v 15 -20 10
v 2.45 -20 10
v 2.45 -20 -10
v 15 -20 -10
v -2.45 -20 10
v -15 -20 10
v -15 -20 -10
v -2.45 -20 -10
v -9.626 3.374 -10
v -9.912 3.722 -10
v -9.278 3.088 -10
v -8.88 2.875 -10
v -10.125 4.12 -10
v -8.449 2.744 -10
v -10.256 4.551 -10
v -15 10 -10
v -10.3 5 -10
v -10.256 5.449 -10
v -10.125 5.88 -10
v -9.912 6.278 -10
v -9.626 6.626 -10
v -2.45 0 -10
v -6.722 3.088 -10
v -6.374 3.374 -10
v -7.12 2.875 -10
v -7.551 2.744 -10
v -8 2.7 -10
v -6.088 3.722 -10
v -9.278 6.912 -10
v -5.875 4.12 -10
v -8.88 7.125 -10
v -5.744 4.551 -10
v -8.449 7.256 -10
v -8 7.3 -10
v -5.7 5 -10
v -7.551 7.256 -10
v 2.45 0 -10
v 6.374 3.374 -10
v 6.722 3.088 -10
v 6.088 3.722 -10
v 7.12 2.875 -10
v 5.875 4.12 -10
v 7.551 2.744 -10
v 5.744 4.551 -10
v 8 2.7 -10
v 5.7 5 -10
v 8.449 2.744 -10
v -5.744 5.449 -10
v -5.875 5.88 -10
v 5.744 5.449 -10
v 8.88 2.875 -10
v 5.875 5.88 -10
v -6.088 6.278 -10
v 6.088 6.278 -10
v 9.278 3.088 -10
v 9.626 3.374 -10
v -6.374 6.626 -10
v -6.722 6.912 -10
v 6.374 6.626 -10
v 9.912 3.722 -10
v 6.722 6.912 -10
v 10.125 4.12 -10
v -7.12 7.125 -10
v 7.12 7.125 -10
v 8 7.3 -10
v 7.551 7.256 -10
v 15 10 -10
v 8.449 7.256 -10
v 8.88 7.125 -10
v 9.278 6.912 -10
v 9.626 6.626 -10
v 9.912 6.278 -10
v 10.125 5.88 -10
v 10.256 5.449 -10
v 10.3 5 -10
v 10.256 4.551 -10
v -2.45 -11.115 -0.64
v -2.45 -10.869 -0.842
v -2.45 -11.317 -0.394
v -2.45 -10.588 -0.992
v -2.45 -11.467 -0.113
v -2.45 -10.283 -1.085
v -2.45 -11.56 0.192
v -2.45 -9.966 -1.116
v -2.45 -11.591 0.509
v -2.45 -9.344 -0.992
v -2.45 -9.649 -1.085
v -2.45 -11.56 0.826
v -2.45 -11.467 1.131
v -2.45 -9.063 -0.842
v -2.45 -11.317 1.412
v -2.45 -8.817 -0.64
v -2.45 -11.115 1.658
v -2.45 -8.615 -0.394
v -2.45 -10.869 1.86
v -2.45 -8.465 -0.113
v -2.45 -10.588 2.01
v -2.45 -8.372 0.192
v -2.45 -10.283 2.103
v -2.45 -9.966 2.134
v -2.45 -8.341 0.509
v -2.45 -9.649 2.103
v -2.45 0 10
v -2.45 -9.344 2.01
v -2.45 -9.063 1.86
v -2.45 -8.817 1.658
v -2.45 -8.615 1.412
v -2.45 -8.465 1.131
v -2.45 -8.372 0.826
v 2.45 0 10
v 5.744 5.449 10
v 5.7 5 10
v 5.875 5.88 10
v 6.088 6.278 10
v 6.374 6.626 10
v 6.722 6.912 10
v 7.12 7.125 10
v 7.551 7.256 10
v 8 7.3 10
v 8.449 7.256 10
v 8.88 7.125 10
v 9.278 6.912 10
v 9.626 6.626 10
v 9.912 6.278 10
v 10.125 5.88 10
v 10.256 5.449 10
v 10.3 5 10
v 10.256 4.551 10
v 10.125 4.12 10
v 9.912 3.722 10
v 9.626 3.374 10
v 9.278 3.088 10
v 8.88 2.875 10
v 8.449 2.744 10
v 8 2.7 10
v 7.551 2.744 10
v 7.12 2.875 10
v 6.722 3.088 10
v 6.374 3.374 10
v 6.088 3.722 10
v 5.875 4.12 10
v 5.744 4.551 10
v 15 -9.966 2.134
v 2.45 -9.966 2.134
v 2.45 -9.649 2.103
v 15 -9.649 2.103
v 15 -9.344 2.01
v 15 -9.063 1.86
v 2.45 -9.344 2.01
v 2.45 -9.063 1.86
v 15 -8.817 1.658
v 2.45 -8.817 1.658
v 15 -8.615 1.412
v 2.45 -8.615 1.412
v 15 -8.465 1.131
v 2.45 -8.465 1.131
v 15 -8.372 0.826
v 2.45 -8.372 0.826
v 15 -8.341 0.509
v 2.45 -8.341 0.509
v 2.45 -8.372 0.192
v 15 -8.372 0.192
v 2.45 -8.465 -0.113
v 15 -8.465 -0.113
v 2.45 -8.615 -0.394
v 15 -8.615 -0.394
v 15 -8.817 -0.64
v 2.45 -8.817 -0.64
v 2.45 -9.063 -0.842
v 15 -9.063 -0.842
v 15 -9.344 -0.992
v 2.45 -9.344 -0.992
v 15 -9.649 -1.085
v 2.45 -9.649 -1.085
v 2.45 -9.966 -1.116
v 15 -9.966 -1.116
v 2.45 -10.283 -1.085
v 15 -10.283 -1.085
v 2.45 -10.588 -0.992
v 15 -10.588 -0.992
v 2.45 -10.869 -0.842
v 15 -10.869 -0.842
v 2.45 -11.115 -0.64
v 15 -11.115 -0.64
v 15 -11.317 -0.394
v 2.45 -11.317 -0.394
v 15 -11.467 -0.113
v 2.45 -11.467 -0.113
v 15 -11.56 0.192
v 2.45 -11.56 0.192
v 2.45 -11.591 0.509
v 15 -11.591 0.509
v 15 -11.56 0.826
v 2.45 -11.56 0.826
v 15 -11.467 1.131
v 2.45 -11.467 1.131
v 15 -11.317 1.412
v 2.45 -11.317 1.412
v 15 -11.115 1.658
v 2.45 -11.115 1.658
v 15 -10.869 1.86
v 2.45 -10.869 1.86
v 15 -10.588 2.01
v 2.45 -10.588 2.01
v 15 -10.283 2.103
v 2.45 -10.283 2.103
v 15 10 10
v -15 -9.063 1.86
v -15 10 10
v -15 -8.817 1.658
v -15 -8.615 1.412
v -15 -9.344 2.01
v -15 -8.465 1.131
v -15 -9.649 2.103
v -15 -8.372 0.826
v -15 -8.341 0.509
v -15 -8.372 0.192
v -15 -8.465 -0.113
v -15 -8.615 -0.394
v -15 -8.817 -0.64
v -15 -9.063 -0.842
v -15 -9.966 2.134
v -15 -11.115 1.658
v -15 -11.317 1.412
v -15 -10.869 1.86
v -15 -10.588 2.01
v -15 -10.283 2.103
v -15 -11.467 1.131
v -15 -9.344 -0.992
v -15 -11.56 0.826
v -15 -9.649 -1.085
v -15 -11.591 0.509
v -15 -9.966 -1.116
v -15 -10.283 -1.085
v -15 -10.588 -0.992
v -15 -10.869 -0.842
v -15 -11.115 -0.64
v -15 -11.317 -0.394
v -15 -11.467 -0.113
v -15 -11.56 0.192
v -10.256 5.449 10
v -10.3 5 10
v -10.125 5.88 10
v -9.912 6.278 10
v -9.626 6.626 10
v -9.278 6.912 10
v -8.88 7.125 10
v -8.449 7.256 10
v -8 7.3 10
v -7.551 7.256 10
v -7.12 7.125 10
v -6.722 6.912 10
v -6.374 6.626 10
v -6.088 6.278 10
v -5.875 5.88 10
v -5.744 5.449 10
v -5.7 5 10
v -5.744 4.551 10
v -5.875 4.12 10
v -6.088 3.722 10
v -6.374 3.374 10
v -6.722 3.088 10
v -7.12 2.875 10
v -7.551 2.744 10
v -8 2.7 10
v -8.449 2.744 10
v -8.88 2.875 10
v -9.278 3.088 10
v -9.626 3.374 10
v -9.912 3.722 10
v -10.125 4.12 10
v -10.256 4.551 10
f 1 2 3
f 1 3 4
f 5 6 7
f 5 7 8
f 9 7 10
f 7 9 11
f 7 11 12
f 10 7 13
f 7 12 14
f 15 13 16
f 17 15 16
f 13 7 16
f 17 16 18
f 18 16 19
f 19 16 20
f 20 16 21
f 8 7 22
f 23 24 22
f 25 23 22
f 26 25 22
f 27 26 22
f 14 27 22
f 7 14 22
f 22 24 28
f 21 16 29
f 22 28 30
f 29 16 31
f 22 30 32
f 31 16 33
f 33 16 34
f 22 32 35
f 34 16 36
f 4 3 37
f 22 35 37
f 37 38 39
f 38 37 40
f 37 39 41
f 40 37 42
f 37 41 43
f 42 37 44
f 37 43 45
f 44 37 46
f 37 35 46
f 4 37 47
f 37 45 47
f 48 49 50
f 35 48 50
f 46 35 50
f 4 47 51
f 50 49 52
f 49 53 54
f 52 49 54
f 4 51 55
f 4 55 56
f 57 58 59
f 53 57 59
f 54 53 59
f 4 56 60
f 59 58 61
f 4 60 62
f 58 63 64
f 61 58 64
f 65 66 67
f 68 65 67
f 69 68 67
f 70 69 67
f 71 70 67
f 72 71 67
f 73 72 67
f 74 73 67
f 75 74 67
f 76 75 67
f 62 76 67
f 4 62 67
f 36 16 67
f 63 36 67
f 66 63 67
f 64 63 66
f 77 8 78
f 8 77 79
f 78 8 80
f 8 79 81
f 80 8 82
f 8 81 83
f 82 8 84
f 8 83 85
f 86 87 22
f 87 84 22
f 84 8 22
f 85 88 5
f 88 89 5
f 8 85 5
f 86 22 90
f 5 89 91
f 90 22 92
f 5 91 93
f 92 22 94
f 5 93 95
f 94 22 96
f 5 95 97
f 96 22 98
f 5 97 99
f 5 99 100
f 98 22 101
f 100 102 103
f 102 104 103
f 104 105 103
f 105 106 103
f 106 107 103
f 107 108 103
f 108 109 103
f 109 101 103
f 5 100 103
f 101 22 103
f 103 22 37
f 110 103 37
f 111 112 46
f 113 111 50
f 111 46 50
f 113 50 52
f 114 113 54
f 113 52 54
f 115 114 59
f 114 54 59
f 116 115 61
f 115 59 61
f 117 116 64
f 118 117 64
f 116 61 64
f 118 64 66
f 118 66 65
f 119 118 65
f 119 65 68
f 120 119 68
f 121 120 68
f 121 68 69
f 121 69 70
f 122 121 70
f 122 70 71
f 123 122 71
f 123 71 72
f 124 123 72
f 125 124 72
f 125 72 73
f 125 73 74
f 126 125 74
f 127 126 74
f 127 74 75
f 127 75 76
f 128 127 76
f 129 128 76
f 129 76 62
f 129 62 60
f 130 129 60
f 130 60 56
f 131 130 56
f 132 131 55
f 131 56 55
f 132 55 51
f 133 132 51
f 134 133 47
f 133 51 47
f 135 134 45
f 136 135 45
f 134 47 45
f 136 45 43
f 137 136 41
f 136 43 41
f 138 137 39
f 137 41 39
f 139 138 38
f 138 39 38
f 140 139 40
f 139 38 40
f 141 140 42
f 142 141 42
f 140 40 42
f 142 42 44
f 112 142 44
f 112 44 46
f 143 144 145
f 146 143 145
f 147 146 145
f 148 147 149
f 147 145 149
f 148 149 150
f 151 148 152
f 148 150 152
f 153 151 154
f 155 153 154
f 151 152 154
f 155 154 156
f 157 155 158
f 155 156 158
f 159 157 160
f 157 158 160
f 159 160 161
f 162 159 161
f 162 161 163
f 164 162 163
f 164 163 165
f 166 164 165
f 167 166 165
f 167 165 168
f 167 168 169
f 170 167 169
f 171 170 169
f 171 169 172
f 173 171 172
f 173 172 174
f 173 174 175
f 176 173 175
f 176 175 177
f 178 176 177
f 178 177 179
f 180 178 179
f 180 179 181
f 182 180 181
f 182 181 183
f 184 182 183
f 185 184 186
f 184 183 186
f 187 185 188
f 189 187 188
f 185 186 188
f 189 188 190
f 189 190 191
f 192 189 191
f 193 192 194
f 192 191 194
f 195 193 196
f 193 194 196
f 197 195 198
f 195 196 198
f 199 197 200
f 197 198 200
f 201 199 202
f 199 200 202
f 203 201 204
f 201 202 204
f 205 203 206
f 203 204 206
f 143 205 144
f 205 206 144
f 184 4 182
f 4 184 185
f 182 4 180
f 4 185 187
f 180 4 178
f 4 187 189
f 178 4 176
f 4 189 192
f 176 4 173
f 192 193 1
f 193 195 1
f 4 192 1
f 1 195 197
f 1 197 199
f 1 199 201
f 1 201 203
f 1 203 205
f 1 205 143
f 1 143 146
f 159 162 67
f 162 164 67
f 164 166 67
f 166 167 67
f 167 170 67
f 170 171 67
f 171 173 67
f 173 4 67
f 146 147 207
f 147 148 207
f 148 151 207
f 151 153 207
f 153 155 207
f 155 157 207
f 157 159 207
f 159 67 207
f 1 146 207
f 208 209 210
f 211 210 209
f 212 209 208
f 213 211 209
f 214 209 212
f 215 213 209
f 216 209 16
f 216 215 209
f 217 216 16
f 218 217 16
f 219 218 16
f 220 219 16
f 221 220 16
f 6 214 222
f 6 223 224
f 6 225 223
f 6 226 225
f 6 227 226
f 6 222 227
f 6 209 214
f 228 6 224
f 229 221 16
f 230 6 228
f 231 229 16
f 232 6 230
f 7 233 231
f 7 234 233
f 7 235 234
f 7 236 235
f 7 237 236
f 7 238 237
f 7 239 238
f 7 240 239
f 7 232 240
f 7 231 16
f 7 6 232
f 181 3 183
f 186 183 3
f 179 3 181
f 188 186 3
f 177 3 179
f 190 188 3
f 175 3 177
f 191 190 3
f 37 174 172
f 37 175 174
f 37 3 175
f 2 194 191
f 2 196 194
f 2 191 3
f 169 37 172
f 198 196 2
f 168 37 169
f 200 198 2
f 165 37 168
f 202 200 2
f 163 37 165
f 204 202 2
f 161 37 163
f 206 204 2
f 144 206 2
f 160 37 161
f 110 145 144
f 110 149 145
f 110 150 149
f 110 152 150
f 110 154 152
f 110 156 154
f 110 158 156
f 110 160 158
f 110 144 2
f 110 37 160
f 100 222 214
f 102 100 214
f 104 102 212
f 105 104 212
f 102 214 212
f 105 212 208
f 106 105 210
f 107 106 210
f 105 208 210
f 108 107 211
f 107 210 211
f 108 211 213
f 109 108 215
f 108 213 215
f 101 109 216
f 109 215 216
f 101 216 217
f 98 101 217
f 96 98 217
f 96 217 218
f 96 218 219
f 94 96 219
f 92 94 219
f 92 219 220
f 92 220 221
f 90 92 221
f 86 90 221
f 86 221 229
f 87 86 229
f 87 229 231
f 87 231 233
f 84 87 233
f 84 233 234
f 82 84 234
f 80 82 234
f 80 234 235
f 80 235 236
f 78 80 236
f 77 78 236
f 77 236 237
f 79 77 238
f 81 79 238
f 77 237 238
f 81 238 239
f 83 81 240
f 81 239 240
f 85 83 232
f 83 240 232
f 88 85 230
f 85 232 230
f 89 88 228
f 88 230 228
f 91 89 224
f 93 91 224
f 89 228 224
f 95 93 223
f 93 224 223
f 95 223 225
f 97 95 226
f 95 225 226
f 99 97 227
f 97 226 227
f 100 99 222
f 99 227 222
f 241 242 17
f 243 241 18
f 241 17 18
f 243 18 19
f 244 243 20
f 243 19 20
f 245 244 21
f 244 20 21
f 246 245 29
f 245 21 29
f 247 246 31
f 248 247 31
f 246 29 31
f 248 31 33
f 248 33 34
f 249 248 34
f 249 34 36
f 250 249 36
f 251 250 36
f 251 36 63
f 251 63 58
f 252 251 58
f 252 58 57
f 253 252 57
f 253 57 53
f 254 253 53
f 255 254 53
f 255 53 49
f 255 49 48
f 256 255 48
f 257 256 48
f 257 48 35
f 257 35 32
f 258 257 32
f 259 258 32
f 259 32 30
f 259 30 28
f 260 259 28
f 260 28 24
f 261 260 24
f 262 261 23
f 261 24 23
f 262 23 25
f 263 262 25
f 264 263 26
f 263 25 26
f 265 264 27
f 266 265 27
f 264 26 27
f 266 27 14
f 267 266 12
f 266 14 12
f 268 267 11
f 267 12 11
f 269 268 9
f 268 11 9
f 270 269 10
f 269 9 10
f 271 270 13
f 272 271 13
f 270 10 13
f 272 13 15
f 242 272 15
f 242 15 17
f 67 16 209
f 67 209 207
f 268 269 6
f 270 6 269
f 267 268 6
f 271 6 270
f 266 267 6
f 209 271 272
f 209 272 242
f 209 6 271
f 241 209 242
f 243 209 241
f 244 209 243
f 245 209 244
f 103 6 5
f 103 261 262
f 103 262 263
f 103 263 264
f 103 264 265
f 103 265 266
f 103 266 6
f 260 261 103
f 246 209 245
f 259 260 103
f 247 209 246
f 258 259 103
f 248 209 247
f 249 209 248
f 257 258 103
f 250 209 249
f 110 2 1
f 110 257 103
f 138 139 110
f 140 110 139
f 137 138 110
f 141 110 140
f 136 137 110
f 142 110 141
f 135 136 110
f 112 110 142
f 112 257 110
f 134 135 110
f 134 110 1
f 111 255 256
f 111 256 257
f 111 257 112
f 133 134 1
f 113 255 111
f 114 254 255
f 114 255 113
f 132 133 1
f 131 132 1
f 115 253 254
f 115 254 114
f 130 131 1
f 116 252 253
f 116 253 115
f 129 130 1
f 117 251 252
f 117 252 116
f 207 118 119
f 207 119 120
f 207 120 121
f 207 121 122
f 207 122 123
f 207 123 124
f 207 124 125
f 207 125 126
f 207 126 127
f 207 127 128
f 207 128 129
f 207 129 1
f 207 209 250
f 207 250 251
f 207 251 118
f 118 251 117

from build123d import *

# Parameters (mm, degrees)
SKETCH1_W           = 30
SKETCH1_H           = 20
BOSS_EXTRUDE1_DEPTH = 10
SKETCH3_W           = 12.55
SKETCH3_H           = 20
BOSS_EXTRUDE3_DEPTH = 20
SKETCH6_R           = 2.3
CUT_EXTRUDE1_DEPTH  = 33.015621187
SKETCH7_R           = 1.625
CUT_EXTRUDE2_DEPTH  = 141.678400141


with BuildPart() as part:
    # Sketch1 → Boss-Extrude1 (new body)
    with BuildSketch(Plane(origin=(0, 0, 0), x_dir=(1, 0, 0), z_dir=(0, 1, 0))):
        Rectangle(SKETCH1_W, SKETCH1_H)
    extrude(amount=BOSS_EXTRUDE1_DEPTH)

    # Sketch3 → Boss-Extrude3 (add)
    with BuildSketch(Plane.XZ):
        with Locations((8.725, 0)):
            Rectangle(SKETCH3_W, SKETCH3_H)
        with Locations((-8.725, 0)):
            Rectangle(SKETCH3_W, SKETCH3_H)
    extrude(amount=BOSS_EXTRUDE3_DEPTH)

    # Sketch6 → Cut-Extrude1 (cut, through all)
    with BuildSketch(Plane(origin=(0, 0, -10), x_dir=(-1, 0, 0), z_dir=(0, 0, -1))):
        with Locations((8, 5)):
            Circle(SKETCH6_R)
        with Locations((-8, 5)):
            Circle(SKETCH6_R)
    extrude(amount=-CUT_EXTRUDE1_DEPTH, mode=Mode.SUBTRACT)

    # Sketch7 → Cut-Extrude2 (cut, through all)
    with BuildSketch(Plane(origin=(-15, -86.420292381, -87.946615477), x_dir=(0, 1, 0), z_dir=(-1, 0, 0))):
        with Locations(Location((76.454314497, -88.455505565, 0), (0, 0, 270))):
            Circle(SKETCH7_R)
    extrude(amount=-CUT_EXTRUDE2_DEPTH, mode=Mode.SUBTRACT)


solid = part.part
